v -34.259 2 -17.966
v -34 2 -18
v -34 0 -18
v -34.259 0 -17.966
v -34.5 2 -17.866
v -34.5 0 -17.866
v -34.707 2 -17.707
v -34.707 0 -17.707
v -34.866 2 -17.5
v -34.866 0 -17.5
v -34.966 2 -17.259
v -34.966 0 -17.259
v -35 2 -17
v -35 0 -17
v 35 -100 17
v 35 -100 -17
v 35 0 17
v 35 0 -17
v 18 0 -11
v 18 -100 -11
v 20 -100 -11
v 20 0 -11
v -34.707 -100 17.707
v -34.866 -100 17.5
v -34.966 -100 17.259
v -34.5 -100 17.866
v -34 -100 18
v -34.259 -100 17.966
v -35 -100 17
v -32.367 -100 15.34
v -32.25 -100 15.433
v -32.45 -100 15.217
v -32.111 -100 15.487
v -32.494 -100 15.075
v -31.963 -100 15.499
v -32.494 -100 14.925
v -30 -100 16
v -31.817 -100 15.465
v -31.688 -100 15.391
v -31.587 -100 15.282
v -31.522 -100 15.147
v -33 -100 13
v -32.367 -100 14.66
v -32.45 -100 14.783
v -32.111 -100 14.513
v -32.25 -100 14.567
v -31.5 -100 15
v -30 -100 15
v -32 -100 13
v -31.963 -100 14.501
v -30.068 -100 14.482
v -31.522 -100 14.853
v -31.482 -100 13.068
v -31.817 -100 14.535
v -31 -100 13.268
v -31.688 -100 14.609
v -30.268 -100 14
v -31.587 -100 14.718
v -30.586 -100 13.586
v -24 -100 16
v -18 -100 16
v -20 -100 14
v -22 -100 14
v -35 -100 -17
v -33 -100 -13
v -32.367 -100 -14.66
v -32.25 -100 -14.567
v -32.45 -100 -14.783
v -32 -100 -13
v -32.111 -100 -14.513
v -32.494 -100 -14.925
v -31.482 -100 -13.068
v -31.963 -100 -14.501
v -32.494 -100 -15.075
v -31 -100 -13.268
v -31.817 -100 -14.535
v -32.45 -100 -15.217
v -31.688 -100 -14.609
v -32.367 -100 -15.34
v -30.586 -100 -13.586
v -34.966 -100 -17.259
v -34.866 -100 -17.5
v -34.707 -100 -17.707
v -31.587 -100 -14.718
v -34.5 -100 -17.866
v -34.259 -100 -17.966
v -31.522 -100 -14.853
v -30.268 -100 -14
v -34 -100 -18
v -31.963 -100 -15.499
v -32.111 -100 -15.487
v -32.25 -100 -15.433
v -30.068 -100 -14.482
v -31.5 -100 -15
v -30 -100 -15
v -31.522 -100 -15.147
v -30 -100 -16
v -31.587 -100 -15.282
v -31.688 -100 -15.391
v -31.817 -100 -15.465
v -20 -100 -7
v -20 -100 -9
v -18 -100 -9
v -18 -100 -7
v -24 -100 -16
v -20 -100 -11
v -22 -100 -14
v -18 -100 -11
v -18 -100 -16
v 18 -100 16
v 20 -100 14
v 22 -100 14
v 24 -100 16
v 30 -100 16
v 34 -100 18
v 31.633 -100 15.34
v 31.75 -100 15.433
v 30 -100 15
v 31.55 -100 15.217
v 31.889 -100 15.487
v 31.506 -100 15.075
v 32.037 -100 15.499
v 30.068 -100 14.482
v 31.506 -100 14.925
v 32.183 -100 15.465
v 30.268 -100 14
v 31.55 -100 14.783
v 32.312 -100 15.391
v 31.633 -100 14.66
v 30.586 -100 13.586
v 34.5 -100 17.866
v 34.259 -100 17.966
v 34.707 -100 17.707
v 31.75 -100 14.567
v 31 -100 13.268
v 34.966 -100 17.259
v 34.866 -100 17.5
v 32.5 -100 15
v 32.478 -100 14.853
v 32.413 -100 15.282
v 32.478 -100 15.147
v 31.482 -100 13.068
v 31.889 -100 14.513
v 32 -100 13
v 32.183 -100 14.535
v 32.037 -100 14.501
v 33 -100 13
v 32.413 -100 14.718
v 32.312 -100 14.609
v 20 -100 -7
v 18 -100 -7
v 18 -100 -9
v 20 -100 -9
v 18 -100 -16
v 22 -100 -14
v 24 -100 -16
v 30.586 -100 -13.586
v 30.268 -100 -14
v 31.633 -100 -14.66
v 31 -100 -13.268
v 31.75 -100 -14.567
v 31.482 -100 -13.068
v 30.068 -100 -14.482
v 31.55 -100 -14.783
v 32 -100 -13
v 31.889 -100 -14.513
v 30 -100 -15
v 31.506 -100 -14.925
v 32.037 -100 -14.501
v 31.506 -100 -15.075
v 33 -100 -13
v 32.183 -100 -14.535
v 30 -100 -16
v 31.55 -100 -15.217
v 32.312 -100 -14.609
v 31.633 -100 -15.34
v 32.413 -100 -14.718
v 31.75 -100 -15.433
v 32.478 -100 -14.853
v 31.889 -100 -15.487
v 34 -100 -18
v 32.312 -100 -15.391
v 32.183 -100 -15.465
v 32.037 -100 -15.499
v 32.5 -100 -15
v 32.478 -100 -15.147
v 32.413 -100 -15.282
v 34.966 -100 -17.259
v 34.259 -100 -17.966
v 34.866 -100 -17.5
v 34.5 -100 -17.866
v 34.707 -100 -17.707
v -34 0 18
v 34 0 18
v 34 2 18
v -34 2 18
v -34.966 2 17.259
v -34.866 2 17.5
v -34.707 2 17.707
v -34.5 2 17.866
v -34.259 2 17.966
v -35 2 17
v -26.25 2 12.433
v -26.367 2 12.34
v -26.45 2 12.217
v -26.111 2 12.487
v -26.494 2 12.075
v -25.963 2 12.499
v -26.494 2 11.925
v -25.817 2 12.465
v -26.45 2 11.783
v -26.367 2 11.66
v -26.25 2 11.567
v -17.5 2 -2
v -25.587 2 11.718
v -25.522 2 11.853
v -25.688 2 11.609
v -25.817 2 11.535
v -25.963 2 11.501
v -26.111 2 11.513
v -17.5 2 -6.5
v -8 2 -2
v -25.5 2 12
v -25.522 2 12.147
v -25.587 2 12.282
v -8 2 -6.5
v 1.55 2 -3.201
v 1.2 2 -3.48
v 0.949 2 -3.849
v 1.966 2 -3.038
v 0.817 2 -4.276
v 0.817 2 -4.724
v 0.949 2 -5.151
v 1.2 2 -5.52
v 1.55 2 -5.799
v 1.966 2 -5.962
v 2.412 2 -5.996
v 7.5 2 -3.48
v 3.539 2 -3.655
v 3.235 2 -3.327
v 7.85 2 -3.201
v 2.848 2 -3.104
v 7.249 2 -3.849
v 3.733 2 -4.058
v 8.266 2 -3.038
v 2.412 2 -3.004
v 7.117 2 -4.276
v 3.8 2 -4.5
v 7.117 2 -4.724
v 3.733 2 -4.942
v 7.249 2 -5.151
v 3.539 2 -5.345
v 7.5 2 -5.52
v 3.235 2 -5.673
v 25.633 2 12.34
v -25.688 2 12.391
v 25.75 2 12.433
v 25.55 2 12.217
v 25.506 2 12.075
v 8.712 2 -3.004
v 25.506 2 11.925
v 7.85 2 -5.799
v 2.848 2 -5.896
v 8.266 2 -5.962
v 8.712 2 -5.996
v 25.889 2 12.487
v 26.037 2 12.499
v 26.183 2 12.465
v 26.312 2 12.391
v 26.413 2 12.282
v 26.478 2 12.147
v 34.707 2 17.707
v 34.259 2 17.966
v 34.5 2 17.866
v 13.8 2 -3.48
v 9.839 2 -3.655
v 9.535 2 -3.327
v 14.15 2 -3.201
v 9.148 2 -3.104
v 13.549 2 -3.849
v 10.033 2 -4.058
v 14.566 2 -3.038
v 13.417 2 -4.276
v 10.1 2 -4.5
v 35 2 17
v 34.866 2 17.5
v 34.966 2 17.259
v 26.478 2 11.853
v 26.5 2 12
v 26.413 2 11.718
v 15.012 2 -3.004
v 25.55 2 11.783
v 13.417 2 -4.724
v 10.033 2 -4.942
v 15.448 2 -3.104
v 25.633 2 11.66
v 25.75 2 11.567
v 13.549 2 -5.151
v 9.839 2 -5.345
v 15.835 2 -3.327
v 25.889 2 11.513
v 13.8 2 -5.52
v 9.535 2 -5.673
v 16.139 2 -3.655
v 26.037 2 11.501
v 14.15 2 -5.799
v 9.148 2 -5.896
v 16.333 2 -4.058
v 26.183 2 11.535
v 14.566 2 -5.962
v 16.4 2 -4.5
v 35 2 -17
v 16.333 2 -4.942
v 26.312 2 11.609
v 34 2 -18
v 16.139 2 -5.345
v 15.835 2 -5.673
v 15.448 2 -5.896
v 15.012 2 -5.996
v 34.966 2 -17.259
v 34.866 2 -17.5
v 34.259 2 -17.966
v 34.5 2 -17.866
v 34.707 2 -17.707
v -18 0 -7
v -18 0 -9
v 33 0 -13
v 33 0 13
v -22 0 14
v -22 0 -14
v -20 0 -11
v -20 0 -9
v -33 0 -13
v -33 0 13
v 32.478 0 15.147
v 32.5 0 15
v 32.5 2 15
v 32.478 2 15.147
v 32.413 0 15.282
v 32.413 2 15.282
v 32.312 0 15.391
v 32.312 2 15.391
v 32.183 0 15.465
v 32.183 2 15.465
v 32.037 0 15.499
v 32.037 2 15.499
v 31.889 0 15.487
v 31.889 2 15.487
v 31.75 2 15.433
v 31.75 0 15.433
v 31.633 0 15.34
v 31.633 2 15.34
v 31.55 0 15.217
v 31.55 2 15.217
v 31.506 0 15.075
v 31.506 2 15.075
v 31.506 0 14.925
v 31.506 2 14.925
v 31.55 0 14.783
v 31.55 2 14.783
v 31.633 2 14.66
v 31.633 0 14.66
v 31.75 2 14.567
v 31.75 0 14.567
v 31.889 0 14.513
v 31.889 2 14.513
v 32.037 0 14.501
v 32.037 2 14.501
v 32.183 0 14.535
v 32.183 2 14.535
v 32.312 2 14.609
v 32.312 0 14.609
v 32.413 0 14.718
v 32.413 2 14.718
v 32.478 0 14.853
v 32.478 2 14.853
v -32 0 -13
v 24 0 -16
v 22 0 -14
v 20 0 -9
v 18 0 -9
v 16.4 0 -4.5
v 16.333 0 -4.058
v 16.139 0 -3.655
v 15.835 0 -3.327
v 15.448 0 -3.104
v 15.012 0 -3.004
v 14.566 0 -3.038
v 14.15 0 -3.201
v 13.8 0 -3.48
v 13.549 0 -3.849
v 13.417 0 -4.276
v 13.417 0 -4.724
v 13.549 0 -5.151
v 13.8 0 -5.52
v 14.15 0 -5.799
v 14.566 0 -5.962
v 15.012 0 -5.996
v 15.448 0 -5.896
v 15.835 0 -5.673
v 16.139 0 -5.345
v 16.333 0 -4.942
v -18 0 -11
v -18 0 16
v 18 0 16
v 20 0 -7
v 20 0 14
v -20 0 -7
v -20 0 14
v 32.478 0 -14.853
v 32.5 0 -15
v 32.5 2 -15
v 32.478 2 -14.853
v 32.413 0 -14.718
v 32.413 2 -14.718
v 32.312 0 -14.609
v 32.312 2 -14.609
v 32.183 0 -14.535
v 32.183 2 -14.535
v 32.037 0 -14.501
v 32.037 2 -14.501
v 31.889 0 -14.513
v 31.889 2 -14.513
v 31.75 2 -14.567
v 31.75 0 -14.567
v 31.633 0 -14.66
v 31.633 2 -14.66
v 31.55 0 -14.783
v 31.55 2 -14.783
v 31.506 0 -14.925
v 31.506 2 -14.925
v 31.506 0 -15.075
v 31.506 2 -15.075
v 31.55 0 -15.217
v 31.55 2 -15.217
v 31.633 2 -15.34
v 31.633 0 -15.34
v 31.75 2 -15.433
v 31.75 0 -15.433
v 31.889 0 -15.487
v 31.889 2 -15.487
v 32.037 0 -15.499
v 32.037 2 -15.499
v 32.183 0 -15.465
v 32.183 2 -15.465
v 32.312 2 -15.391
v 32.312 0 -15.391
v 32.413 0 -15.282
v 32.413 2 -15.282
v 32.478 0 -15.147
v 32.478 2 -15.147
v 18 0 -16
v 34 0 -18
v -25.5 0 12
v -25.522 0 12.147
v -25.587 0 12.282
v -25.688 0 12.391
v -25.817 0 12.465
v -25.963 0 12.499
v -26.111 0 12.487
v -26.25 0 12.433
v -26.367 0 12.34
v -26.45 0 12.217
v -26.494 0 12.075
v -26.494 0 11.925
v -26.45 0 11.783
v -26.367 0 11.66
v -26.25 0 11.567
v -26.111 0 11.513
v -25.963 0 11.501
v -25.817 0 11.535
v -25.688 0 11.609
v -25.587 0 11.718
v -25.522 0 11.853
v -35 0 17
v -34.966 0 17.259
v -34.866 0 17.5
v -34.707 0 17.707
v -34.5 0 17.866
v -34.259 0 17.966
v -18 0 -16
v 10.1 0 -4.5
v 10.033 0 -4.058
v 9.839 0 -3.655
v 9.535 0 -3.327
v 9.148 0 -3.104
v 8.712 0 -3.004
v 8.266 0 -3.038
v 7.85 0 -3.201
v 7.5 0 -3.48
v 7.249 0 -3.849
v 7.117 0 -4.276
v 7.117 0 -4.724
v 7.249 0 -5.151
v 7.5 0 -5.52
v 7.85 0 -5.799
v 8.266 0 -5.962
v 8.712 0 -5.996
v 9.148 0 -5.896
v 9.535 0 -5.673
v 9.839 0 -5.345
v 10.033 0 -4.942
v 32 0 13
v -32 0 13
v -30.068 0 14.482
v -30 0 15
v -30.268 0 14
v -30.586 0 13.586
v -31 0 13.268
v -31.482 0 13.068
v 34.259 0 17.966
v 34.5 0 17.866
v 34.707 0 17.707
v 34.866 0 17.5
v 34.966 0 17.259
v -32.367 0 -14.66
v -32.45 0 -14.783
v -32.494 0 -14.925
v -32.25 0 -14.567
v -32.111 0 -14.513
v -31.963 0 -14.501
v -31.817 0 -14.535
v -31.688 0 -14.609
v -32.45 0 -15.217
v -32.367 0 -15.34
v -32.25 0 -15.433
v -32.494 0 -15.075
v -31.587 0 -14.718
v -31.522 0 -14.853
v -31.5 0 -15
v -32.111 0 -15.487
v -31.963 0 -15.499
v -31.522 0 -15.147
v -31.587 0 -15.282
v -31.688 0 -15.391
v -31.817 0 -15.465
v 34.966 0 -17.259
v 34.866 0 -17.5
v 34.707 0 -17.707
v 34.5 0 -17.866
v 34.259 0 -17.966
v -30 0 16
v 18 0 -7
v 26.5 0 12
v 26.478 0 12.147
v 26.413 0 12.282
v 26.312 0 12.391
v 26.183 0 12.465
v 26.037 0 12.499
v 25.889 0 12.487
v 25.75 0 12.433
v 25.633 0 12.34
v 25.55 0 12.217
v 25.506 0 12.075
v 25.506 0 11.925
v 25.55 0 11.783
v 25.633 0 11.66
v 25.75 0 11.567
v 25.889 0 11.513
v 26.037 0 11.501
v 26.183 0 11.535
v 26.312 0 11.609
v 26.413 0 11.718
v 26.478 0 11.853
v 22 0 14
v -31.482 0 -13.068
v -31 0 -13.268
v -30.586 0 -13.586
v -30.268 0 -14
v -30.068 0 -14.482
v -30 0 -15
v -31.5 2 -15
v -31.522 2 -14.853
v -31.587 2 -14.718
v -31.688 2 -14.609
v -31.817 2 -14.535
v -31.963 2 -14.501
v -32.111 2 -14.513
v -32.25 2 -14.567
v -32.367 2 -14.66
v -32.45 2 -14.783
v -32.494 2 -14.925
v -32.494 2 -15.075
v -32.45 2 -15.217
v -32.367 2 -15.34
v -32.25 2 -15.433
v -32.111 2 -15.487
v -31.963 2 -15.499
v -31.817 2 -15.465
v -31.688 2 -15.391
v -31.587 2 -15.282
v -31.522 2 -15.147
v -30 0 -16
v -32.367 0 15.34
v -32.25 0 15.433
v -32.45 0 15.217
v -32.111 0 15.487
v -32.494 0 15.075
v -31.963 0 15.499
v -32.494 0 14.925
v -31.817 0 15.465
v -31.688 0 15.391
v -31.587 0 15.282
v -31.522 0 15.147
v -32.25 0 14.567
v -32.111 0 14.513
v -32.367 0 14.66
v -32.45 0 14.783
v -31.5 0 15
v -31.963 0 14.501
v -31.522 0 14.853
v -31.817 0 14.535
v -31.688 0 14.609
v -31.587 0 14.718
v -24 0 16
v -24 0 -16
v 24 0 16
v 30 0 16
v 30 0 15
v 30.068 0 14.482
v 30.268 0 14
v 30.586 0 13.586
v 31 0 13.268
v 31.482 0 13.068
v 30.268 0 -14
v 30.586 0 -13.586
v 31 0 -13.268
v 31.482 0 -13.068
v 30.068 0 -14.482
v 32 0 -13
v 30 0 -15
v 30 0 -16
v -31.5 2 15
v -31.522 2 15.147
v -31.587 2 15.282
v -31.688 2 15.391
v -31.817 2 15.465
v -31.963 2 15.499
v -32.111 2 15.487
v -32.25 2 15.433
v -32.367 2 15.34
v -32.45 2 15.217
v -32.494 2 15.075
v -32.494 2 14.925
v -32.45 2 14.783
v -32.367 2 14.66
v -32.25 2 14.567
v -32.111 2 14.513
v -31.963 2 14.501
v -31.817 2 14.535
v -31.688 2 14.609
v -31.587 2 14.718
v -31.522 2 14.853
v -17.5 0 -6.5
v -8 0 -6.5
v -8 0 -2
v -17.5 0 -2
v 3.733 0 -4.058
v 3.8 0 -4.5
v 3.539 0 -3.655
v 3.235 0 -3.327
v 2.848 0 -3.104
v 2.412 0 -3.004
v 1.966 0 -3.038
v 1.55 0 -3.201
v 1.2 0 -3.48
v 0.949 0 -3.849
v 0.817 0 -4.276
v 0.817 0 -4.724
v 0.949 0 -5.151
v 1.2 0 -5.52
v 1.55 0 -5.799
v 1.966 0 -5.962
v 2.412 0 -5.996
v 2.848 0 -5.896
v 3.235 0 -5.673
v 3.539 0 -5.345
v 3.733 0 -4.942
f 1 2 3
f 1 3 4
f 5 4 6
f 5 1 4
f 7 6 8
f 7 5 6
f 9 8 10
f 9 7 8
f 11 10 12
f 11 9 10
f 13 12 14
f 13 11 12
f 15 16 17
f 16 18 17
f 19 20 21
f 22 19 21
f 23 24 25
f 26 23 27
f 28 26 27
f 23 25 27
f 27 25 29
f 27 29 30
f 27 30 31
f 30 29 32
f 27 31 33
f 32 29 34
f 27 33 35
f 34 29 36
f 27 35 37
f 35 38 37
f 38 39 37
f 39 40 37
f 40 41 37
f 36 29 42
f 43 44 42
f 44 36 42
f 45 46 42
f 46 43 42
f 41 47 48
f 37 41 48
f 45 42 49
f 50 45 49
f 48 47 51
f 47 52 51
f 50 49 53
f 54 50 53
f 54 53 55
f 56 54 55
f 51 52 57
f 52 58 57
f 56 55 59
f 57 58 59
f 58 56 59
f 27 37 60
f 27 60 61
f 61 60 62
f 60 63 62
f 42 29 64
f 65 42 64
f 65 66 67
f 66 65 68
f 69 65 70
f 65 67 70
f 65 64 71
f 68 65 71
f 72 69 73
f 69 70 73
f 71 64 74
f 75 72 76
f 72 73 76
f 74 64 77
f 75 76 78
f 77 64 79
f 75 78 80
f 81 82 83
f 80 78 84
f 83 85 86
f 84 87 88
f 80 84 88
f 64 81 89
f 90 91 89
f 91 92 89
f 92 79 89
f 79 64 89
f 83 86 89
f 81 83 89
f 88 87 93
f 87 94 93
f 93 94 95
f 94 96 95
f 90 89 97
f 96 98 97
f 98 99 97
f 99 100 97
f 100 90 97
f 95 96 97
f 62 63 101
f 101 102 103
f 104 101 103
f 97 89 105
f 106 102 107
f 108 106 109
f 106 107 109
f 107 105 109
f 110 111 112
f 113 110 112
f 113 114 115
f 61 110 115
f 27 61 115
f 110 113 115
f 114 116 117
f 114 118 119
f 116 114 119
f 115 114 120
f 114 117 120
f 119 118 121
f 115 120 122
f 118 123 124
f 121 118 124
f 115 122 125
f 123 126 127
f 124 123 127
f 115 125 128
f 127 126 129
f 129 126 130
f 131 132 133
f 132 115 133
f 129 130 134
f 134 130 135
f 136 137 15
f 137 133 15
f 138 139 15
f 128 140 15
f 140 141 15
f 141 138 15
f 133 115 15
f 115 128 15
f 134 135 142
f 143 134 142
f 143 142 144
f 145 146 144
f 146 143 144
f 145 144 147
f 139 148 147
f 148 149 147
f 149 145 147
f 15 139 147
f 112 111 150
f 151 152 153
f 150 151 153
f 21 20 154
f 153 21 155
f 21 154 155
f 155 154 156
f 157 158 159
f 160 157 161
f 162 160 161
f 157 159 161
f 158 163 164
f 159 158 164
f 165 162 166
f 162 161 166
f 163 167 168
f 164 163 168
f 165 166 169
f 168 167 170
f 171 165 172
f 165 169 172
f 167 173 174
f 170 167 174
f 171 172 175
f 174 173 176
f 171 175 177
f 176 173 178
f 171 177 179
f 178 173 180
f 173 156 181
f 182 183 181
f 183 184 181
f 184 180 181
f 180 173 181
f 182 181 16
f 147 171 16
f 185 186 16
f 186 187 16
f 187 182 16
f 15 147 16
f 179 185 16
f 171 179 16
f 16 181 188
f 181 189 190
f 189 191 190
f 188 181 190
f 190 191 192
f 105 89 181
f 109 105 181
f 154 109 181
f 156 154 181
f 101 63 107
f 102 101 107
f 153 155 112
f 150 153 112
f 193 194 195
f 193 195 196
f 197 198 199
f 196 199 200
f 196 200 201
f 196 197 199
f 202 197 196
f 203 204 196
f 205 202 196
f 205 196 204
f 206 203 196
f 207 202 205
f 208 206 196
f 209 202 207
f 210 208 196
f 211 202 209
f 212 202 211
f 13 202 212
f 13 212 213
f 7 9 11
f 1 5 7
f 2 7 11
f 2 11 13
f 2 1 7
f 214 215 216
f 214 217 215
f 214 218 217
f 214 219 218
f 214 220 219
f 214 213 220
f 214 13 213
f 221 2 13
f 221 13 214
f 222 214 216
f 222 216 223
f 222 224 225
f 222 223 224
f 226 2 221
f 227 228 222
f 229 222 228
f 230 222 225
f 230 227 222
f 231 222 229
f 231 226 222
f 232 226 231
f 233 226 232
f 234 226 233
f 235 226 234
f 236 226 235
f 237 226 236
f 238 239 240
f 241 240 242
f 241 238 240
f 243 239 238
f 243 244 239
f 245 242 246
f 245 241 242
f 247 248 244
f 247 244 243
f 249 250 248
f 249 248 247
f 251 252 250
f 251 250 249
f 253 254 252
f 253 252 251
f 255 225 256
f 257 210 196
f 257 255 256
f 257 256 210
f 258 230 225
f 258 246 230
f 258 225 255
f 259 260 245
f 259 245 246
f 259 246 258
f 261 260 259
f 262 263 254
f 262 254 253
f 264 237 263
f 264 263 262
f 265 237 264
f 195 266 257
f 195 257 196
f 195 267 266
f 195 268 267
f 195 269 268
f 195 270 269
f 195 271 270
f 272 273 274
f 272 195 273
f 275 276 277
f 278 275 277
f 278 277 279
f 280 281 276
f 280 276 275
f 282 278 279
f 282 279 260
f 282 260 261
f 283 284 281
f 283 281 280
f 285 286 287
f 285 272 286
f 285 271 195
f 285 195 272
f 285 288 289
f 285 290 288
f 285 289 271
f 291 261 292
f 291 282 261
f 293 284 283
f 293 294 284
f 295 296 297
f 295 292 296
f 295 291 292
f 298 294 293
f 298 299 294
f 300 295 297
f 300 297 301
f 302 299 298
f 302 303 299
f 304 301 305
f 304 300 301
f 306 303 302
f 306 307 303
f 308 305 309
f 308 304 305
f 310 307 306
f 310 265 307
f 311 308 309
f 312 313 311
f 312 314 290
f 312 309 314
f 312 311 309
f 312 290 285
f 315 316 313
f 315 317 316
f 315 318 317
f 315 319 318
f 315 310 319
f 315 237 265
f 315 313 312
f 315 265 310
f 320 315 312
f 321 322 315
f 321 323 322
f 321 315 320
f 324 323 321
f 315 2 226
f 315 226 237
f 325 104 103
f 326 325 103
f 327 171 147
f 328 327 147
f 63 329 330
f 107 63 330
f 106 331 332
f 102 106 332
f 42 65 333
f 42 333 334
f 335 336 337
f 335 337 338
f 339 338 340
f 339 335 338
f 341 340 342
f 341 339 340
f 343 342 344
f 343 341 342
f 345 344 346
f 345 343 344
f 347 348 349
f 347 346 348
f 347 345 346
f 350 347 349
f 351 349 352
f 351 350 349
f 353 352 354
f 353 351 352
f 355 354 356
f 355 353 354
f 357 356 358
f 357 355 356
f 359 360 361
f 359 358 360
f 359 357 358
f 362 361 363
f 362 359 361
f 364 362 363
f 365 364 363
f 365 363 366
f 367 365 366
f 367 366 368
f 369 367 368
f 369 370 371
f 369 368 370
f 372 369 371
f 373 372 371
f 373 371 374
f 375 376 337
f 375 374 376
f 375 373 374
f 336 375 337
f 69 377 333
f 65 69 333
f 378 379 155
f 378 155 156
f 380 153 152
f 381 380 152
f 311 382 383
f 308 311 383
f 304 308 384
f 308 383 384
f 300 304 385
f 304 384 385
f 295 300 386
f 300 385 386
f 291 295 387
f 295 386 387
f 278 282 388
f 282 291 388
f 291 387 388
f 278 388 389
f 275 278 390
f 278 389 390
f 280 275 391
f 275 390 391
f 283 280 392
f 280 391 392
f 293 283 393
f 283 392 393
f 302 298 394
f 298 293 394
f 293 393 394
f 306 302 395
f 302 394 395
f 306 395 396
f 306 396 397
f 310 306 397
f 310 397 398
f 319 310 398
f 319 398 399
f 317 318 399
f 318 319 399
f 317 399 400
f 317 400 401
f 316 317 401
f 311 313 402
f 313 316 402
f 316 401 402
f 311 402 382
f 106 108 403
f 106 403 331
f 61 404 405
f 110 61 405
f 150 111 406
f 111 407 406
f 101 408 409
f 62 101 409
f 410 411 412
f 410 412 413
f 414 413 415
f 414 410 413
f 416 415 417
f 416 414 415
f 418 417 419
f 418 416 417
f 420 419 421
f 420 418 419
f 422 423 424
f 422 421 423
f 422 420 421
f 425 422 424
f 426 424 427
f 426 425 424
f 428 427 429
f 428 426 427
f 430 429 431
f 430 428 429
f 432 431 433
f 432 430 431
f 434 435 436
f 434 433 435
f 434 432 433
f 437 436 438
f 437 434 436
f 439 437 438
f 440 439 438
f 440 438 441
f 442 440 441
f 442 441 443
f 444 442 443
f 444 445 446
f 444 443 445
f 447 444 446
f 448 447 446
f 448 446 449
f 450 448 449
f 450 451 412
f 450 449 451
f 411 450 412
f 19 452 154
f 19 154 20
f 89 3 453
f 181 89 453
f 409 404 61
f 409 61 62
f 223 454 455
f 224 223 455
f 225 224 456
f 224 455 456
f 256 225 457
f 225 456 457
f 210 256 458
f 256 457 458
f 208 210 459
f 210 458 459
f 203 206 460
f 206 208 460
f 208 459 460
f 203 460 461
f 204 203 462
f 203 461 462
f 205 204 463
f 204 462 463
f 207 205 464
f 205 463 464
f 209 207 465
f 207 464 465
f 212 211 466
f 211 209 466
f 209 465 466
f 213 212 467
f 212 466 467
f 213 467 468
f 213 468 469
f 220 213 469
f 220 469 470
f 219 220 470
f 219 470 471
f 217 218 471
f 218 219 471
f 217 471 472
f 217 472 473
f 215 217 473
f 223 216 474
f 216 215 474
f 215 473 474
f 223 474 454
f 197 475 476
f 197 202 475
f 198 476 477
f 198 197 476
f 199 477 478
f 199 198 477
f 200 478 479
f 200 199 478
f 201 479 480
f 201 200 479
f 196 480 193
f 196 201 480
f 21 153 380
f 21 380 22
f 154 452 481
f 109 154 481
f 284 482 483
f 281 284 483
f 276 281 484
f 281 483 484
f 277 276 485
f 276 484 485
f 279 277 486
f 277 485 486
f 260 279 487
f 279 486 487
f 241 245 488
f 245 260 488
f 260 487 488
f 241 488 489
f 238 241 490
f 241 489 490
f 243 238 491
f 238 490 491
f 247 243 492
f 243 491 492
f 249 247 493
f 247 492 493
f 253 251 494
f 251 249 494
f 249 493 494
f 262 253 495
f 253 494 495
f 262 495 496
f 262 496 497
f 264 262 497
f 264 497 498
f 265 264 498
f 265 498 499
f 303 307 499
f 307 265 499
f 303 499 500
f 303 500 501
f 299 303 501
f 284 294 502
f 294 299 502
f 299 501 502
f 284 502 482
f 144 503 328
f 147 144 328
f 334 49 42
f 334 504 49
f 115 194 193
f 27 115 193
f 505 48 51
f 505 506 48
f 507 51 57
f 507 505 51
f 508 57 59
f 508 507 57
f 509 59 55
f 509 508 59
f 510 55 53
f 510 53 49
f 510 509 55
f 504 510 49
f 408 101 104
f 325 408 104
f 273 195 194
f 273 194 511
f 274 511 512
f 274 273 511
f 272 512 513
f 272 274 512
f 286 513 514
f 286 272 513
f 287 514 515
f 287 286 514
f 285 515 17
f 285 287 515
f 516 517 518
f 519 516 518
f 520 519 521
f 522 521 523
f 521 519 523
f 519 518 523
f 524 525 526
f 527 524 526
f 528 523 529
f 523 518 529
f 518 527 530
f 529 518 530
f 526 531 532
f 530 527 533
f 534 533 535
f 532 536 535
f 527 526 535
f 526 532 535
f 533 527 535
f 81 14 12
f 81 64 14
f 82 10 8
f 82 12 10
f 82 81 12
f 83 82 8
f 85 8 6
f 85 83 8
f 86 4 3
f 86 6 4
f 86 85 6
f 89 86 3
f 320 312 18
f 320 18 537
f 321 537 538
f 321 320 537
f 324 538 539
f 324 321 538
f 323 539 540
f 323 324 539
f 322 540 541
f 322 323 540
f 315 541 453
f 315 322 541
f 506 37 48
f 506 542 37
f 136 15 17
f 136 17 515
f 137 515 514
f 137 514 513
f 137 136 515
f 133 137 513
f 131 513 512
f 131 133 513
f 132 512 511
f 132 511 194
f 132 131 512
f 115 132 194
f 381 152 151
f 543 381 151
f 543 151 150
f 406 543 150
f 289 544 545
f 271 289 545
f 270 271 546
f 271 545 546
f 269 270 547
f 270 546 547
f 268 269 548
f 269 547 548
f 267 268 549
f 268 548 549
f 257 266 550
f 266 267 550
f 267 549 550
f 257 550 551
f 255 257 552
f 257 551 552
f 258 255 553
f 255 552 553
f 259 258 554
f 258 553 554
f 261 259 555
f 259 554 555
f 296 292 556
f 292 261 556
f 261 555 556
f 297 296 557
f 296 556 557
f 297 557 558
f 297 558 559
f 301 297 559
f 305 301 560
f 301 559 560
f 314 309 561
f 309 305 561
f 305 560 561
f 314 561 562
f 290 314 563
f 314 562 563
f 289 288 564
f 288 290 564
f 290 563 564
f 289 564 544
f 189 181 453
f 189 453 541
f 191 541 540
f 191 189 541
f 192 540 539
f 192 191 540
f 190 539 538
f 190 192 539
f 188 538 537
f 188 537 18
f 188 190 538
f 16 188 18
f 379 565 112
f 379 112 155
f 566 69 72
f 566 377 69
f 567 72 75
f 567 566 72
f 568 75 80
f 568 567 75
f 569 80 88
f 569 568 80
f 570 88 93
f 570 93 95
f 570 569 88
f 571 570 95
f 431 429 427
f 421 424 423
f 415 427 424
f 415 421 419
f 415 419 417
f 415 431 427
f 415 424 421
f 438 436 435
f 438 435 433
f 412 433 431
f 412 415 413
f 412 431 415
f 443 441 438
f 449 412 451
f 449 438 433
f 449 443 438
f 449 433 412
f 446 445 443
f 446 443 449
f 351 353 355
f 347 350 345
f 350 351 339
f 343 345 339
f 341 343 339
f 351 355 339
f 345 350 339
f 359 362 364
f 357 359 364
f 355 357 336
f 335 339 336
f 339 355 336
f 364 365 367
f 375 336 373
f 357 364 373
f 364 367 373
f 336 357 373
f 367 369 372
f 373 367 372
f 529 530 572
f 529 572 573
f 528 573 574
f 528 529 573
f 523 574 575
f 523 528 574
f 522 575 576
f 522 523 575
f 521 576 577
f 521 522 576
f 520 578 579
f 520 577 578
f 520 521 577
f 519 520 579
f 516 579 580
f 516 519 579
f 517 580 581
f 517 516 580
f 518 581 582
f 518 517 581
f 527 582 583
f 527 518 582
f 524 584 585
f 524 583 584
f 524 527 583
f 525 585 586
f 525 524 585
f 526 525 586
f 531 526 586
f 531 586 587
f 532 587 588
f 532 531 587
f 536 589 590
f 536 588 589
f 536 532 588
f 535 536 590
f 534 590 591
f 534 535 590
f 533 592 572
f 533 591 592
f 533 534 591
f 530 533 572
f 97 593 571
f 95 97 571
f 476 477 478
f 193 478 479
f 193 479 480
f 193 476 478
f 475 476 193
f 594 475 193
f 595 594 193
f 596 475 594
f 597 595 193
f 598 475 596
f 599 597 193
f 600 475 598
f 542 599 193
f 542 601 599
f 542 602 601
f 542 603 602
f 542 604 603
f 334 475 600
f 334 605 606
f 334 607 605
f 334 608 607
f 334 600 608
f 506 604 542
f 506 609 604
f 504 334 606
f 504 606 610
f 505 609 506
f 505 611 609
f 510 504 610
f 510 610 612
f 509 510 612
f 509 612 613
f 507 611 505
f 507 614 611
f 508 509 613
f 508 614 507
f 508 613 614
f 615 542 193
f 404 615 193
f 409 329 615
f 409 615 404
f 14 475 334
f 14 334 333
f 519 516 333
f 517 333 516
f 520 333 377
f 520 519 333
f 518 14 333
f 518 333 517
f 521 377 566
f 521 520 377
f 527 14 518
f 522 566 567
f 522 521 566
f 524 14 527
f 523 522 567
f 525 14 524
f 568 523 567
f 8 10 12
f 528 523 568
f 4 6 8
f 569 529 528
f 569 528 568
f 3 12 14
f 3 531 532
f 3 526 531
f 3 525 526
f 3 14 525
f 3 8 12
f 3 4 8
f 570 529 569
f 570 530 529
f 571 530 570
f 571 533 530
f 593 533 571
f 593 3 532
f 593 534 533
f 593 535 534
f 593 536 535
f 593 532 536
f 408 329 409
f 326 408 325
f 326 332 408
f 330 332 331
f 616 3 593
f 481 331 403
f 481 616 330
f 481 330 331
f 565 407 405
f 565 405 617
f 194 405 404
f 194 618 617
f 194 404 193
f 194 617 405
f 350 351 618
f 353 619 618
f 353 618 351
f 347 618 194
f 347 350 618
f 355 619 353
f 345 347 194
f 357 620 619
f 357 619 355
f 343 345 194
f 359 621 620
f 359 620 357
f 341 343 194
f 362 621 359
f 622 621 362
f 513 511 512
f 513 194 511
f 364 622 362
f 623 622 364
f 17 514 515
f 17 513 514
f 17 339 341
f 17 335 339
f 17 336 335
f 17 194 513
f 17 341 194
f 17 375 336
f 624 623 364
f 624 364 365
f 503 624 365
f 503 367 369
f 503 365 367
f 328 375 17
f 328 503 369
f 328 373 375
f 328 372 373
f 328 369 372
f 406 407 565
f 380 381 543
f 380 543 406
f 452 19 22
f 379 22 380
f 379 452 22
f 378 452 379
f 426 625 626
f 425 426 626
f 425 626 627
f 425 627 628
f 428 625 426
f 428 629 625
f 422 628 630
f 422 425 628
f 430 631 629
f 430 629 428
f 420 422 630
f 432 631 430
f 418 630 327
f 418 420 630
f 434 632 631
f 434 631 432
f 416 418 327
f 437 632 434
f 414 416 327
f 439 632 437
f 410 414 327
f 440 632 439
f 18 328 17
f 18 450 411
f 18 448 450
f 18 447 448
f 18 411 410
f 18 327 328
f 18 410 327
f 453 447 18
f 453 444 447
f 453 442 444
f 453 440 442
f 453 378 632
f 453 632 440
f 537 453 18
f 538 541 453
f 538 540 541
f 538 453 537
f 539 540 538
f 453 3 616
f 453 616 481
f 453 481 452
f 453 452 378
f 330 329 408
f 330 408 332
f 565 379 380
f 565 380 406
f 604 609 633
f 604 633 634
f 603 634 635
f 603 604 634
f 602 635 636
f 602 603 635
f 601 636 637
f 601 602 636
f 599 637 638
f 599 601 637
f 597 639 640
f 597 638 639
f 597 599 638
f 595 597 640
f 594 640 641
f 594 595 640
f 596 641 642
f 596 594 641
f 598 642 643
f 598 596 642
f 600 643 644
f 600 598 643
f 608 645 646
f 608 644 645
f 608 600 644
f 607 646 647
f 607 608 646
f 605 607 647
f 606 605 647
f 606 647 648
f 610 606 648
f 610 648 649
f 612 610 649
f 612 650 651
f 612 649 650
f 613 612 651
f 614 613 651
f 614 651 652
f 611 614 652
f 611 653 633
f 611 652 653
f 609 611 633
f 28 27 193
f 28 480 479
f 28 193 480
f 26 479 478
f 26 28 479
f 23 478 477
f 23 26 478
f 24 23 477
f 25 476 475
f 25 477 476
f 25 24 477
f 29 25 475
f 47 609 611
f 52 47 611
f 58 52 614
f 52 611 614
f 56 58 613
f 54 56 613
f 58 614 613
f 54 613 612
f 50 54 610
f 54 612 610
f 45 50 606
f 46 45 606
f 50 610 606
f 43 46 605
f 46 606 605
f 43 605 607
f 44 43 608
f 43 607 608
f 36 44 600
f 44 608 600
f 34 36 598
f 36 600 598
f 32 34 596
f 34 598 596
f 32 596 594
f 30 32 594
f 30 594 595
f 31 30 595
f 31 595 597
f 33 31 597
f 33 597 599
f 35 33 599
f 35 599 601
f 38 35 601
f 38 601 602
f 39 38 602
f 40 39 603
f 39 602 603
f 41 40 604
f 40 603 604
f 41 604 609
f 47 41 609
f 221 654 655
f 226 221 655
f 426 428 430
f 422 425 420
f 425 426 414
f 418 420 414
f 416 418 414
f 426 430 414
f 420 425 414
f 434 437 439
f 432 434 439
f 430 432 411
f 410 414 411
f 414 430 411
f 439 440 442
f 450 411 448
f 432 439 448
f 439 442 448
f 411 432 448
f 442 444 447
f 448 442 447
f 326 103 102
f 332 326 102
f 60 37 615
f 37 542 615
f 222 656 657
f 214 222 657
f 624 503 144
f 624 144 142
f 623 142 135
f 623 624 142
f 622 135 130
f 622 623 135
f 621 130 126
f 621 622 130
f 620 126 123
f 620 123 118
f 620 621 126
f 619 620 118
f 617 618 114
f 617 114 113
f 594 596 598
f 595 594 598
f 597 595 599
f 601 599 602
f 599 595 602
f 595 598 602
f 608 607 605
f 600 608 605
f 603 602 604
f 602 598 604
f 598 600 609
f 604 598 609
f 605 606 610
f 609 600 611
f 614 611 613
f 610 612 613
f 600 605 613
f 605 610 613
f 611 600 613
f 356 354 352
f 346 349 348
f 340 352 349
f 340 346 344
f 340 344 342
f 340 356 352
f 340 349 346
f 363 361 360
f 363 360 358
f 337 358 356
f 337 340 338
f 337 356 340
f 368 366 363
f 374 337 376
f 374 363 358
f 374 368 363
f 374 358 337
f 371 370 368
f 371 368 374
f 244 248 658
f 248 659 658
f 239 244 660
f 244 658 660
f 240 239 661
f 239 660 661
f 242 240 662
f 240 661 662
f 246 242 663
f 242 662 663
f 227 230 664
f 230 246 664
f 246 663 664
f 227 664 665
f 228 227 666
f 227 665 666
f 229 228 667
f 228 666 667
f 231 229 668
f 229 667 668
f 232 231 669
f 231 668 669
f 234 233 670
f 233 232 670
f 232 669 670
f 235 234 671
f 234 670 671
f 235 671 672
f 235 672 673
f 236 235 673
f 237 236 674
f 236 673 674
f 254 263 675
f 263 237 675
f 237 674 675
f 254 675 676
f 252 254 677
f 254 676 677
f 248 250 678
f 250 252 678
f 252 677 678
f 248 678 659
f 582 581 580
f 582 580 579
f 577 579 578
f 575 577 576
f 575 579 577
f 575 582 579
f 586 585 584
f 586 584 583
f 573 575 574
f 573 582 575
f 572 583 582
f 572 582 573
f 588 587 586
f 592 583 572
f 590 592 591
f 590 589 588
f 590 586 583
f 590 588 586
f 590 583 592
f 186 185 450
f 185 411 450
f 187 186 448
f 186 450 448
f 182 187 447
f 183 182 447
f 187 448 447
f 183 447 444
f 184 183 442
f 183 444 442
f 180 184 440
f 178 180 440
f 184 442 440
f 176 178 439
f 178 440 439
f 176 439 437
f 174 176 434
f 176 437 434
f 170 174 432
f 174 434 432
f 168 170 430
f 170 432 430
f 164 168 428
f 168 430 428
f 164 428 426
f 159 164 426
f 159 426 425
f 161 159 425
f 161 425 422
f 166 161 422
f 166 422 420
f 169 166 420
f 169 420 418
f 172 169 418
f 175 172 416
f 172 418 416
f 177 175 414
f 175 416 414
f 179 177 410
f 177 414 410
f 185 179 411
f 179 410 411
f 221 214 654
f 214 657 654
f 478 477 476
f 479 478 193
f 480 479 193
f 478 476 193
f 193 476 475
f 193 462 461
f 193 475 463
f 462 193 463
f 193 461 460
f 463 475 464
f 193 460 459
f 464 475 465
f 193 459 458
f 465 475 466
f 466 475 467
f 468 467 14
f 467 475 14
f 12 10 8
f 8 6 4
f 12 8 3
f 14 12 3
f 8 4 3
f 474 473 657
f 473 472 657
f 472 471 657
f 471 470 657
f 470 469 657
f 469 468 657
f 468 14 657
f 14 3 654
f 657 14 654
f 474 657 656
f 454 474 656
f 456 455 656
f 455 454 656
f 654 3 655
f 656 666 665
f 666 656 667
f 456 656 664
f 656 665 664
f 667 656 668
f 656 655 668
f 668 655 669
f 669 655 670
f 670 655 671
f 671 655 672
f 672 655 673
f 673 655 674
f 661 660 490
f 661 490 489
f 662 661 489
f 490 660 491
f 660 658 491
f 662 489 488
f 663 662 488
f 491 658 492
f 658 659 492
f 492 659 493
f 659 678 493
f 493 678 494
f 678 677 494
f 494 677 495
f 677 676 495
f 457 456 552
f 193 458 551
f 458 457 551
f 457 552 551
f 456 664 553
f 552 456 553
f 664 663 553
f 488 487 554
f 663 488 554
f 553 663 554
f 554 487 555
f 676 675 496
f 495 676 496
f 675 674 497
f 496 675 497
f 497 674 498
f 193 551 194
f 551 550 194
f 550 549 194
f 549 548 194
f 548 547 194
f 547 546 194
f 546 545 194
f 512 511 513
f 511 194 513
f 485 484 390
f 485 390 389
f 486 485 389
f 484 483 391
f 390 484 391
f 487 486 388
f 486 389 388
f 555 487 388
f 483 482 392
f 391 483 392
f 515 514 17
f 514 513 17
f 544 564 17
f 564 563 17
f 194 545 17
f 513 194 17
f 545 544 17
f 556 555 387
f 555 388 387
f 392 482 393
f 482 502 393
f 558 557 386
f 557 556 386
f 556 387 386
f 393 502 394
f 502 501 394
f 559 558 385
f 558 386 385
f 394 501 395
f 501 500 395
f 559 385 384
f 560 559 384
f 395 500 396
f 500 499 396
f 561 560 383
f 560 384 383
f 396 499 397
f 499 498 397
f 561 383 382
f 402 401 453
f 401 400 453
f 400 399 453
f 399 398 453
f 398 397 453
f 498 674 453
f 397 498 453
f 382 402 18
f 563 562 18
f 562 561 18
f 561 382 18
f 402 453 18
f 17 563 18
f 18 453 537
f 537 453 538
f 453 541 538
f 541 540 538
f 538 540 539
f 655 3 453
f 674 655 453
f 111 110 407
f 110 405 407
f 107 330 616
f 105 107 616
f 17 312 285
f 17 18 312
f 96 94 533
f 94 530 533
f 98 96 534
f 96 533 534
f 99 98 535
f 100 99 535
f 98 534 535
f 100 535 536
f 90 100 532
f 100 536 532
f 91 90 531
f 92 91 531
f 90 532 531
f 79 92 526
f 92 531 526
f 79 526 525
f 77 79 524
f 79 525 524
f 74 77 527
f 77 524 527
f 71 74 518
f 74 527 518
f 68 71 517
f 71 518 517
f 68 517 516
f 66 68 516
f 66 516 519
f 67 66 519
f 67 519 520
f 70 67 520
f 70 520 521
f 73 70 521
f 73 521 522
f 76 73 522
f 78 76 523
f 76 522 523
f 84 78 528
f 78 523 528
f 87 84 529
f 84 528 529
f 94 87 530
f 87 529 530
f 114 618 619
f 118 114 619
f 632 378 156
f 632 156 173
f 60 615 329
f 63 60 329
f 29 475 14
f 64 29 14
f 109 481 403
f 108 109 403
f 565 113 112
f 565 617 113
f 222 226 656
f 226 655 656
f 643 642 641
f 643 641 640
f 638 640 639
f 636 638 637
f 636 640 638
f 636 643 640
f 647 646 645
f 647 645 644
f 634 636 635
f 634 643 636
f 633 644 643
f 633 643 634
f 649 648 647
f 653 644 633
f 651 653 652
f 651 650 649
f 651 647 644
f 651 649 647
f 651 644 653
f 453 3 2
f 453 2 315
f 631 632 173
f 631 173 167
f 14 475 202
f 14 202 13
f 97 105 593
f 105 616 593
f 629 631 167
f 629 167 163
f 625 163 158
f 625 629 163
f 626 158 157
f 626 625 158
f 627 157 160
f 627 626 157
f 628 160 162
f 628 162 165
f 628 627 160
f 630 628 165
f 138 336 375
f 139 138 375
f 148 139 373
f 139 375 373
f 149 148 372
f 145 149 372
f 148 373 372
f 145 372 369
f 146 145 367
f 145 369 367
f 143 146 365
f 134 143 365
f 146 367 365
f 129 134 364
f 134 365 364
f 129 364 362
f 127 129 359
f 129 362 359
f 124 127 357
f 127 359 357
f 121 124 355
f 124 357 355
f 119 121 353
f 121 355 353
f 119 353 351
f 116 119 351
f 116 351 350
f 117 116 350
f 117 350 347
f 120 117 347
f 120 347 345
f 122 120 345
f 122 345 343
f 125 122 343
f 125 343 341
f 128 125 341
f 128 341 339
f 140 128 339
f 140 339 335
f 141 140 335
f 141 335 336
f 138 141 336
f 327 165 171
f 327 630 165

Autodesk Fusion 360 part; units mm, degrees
sketch "Esquisse1" plane through (0, 0, 0) normal (0, 1, 0) x (1, 0, 0)
  line L0 (-35, 18) -> (35, 18)
  line L1 (35, 18) -> (35, -18)
  line L2 (35, -18) -> (-35, -18)
  line L3 (-35, -18) -> (-35, 18)
  line L4 (-33, -16) -> (-22, -16)
  line L5 (-22, -16) -> (-22, 16)
  line L6 (-22, 16) -> (-33, 16)
  line L7 (-33, 16) -> (-33, -16)
  line L8 (33, -16) -> (22, -16)
  line L9 (22, -16) -> (22, 16)
  line L10 (22, 16) -> (33, 16)
  line L11 (33, 16) -> (33, -16)
  line L12 (-20, -16) -> (20, -16)
  line L13 (20, -16) -> (20, 16)
  line L14 (20, 16) -> (-20, 16)
  line L15 (-20, 16) -> (-20, -16)
  line L16 (32, -13) -> (33, -13)
  line L17 (33, -13) -> (33, -16)
  line L18 (33, -16) -> (30, -16)
  line L19 (30, -16) -> (30, -15)
  line L20 (32, 13) -> (33, 13)
  line L21 (33, 13) -> (33, 16)
  line L22 (33, 16) -> (30, 16)
  line L23 (30, 16) -> (30, 15)
  circle A0 centre (26, -12) radius 3
  arc A1 (32, -13) -> (30, -15) centre (32, -15) ccw
  arc A2 (30, 15) -> (32, 13) centre (32, 15) ccw
  line L24 (24, -16) -> (22, -14)
  line L25 (22, 14) -> (24, 16)
  line L26 (18, -16) -> (20, -14)
  line L27 (-18, -16) -> (-20, -14)
  line L28 (-22, 14) -> (-24, 16)
  line L29 (-24, -16) -> (-22, -14)
  line L30 (-33, -16) -> (-30, -16)
  line L31 (-30, -16) -> (-30, -15)
  line L32 (-32, -13) -> (-33, -13)
  line L33 (-33, -13) -> (-33, -16)
  line L34 (-32, 13) -> (-33, 13)
  line L35 (-33, 13) -> (-33, 16)
  line L36 (-33, 16) -> (-30, 16)
  line L37 (-30, 16) -> (-30, 15)
  arc A3 (-30, -15) -> (-32, -13) centre (-32, -15) ccw
  arc A4 (-32, 13) -> (-30, 15) centre (-32, 15) ccw
  circle A5 centre (-26, -12) radius 3
  line L38 (-20, 16) -> (-18, 16)
  line L39 (-18, 16) -> (-18, 11)
  line L40 (-18, 11) -> (-20, 11)
  line L41 (-20, 11) -> (-20, 16)
  line L42 (18, 11) -> (20, 11)
  line L43 (20, 11) -> (20, 16)
  line L44 (20, 16) -> (18, 16)
  line L45 (18, 16) -> (18, 11)
  line L46 (20, 9) -> (18, 9)
  line L47 (18, 9) -> (18, 7)
  line L48 (18, 7) -> (20, 7)
  line L49 (20, 7) -> (20, 9)
  line L50 (-18, 9) -> (-20, 9)
  line L51 (-20, 9) -> (-20, 7)
  line L52 (-20, 7) -> (-18, 7)
  line L53 (-18, 7) -> (-18, 9)
  line L54 (-17.5, 6.5) -> (-8, 6.5)
  line L55 (-8, 6.5) -> (-8, 2)
  line L56 (-8, 2) -> (-17.5, 2)
  line L57 (-17.5, 2) -> (-17.5, 6.5)
  line L58 (20, 5) -> (20, 6.5)
  circle A6 centre (14.9, 4.5) radius 1.5
  circle A7 centre (8.6, 4.5) radius 1.5
  circle A8 centre (2.3, 4.5) radius 1.5
  circle A9 centre (-32, -15) radius 0.5
  circle A10 centre (-32, 15) radius 0.5
  circle A11 centre (32, -15) radius 0.5
  circle A12 centre (32, 15) radius 0.5
  circle A13 centre (-26, -12) radius 0.5
  circle A14 centre (26, -12) radius 0.5
extrude "Extrusion2" add sketch "Esquisse1" along normal blind 2 contours L0 L1 L2 L3 | L4 L7 L30 L31 L32 L33 A3 | L4 L5 L6 L7 L28 L29 L31 L32 L34 L37 A3 A4 | L4 L5 L29 | L6 L7 L34 L35 L36 L37 A4 | L5 L6 L28 | L8 L11 L16 L17 L18 L19 A1 | L8 L9 L10 L11 L16 L19 L20 L23 A1 A2 L24 L25 | L8 L9 L24 | L10 L11 L20 L21 L22 L23 A2 | L9 L10 L25 | L12 L15 L27 | L12 L13 L14 L15 L26 L27 L39 L40 L42 L45 L46 L47 L48 L50 L52 L53 L58 | L12 L13 L26 | L15 L50 L51 L52 L53 | L14 L15 L38 L39 L40 L41 | L13 L46 L47 L48 L49 | L13 L14 L42 L43 L44 L45 | A0 | A5 | A9 | A10 | A11 | A12 makes body 1
extrude "Extrusion3" add sketch "Esquisse1" against normal blind 100 separate body contours L0 L1 L2 L3 | L4 L7 L30 L31 L32 L33 A3 | L6 L7 L34 L35 L36 L37 A4 | L8 L11 L16 L17 L18 L19 A1 | L10 L11 L20 L21 L22 L23 A2 makes body 2
extrude "Extrusion4" add sketch "Esquisse1" against normal blind 100 contours L4 L5 L29 | L5 L6 L28 | L8 L9 L24 | L9 L10 L25 | L12 L15 L27 | L12 L13 L26 bodies 2
extrude "Extrusion5" add sketch "Esquisse1" against normal blind 100 contours L15 L50 L51 L52 L53 | L14 L15 L38 L39 L40 L41 | L13 L46 L47 L48 L49 | L13 L14 L42 L43 L44 L45 bodies 2
extrude "Extrusion6" add sketch "Esquisse1" along normal blind 2 separate body contours A9 makes body 3
extrude "Extrusion7" add sketch "Esquisse1" along normal blind 2 separate body contours A11 makes body 4
extrude "Extrusion8" add sketch "Esquisse1" along normal blind 2 separate body contours A12 makes body 5
extrude "Extrusion9" add sketch "Esquisse1" along normal blind 2 separate body contours A10 makes body 6
fillet "Congé1" radius 1 4 edges at (-35, 1, 18) (-35, 1, -18) (35, 1, -18) (35, 1, 18) on bodies 1
fillet "Congé2" radius 1 4 edges at (35, -50, 18) (35, -50, -18) (-35, -50, 18) (-35, -50, -18) on bodies 2
